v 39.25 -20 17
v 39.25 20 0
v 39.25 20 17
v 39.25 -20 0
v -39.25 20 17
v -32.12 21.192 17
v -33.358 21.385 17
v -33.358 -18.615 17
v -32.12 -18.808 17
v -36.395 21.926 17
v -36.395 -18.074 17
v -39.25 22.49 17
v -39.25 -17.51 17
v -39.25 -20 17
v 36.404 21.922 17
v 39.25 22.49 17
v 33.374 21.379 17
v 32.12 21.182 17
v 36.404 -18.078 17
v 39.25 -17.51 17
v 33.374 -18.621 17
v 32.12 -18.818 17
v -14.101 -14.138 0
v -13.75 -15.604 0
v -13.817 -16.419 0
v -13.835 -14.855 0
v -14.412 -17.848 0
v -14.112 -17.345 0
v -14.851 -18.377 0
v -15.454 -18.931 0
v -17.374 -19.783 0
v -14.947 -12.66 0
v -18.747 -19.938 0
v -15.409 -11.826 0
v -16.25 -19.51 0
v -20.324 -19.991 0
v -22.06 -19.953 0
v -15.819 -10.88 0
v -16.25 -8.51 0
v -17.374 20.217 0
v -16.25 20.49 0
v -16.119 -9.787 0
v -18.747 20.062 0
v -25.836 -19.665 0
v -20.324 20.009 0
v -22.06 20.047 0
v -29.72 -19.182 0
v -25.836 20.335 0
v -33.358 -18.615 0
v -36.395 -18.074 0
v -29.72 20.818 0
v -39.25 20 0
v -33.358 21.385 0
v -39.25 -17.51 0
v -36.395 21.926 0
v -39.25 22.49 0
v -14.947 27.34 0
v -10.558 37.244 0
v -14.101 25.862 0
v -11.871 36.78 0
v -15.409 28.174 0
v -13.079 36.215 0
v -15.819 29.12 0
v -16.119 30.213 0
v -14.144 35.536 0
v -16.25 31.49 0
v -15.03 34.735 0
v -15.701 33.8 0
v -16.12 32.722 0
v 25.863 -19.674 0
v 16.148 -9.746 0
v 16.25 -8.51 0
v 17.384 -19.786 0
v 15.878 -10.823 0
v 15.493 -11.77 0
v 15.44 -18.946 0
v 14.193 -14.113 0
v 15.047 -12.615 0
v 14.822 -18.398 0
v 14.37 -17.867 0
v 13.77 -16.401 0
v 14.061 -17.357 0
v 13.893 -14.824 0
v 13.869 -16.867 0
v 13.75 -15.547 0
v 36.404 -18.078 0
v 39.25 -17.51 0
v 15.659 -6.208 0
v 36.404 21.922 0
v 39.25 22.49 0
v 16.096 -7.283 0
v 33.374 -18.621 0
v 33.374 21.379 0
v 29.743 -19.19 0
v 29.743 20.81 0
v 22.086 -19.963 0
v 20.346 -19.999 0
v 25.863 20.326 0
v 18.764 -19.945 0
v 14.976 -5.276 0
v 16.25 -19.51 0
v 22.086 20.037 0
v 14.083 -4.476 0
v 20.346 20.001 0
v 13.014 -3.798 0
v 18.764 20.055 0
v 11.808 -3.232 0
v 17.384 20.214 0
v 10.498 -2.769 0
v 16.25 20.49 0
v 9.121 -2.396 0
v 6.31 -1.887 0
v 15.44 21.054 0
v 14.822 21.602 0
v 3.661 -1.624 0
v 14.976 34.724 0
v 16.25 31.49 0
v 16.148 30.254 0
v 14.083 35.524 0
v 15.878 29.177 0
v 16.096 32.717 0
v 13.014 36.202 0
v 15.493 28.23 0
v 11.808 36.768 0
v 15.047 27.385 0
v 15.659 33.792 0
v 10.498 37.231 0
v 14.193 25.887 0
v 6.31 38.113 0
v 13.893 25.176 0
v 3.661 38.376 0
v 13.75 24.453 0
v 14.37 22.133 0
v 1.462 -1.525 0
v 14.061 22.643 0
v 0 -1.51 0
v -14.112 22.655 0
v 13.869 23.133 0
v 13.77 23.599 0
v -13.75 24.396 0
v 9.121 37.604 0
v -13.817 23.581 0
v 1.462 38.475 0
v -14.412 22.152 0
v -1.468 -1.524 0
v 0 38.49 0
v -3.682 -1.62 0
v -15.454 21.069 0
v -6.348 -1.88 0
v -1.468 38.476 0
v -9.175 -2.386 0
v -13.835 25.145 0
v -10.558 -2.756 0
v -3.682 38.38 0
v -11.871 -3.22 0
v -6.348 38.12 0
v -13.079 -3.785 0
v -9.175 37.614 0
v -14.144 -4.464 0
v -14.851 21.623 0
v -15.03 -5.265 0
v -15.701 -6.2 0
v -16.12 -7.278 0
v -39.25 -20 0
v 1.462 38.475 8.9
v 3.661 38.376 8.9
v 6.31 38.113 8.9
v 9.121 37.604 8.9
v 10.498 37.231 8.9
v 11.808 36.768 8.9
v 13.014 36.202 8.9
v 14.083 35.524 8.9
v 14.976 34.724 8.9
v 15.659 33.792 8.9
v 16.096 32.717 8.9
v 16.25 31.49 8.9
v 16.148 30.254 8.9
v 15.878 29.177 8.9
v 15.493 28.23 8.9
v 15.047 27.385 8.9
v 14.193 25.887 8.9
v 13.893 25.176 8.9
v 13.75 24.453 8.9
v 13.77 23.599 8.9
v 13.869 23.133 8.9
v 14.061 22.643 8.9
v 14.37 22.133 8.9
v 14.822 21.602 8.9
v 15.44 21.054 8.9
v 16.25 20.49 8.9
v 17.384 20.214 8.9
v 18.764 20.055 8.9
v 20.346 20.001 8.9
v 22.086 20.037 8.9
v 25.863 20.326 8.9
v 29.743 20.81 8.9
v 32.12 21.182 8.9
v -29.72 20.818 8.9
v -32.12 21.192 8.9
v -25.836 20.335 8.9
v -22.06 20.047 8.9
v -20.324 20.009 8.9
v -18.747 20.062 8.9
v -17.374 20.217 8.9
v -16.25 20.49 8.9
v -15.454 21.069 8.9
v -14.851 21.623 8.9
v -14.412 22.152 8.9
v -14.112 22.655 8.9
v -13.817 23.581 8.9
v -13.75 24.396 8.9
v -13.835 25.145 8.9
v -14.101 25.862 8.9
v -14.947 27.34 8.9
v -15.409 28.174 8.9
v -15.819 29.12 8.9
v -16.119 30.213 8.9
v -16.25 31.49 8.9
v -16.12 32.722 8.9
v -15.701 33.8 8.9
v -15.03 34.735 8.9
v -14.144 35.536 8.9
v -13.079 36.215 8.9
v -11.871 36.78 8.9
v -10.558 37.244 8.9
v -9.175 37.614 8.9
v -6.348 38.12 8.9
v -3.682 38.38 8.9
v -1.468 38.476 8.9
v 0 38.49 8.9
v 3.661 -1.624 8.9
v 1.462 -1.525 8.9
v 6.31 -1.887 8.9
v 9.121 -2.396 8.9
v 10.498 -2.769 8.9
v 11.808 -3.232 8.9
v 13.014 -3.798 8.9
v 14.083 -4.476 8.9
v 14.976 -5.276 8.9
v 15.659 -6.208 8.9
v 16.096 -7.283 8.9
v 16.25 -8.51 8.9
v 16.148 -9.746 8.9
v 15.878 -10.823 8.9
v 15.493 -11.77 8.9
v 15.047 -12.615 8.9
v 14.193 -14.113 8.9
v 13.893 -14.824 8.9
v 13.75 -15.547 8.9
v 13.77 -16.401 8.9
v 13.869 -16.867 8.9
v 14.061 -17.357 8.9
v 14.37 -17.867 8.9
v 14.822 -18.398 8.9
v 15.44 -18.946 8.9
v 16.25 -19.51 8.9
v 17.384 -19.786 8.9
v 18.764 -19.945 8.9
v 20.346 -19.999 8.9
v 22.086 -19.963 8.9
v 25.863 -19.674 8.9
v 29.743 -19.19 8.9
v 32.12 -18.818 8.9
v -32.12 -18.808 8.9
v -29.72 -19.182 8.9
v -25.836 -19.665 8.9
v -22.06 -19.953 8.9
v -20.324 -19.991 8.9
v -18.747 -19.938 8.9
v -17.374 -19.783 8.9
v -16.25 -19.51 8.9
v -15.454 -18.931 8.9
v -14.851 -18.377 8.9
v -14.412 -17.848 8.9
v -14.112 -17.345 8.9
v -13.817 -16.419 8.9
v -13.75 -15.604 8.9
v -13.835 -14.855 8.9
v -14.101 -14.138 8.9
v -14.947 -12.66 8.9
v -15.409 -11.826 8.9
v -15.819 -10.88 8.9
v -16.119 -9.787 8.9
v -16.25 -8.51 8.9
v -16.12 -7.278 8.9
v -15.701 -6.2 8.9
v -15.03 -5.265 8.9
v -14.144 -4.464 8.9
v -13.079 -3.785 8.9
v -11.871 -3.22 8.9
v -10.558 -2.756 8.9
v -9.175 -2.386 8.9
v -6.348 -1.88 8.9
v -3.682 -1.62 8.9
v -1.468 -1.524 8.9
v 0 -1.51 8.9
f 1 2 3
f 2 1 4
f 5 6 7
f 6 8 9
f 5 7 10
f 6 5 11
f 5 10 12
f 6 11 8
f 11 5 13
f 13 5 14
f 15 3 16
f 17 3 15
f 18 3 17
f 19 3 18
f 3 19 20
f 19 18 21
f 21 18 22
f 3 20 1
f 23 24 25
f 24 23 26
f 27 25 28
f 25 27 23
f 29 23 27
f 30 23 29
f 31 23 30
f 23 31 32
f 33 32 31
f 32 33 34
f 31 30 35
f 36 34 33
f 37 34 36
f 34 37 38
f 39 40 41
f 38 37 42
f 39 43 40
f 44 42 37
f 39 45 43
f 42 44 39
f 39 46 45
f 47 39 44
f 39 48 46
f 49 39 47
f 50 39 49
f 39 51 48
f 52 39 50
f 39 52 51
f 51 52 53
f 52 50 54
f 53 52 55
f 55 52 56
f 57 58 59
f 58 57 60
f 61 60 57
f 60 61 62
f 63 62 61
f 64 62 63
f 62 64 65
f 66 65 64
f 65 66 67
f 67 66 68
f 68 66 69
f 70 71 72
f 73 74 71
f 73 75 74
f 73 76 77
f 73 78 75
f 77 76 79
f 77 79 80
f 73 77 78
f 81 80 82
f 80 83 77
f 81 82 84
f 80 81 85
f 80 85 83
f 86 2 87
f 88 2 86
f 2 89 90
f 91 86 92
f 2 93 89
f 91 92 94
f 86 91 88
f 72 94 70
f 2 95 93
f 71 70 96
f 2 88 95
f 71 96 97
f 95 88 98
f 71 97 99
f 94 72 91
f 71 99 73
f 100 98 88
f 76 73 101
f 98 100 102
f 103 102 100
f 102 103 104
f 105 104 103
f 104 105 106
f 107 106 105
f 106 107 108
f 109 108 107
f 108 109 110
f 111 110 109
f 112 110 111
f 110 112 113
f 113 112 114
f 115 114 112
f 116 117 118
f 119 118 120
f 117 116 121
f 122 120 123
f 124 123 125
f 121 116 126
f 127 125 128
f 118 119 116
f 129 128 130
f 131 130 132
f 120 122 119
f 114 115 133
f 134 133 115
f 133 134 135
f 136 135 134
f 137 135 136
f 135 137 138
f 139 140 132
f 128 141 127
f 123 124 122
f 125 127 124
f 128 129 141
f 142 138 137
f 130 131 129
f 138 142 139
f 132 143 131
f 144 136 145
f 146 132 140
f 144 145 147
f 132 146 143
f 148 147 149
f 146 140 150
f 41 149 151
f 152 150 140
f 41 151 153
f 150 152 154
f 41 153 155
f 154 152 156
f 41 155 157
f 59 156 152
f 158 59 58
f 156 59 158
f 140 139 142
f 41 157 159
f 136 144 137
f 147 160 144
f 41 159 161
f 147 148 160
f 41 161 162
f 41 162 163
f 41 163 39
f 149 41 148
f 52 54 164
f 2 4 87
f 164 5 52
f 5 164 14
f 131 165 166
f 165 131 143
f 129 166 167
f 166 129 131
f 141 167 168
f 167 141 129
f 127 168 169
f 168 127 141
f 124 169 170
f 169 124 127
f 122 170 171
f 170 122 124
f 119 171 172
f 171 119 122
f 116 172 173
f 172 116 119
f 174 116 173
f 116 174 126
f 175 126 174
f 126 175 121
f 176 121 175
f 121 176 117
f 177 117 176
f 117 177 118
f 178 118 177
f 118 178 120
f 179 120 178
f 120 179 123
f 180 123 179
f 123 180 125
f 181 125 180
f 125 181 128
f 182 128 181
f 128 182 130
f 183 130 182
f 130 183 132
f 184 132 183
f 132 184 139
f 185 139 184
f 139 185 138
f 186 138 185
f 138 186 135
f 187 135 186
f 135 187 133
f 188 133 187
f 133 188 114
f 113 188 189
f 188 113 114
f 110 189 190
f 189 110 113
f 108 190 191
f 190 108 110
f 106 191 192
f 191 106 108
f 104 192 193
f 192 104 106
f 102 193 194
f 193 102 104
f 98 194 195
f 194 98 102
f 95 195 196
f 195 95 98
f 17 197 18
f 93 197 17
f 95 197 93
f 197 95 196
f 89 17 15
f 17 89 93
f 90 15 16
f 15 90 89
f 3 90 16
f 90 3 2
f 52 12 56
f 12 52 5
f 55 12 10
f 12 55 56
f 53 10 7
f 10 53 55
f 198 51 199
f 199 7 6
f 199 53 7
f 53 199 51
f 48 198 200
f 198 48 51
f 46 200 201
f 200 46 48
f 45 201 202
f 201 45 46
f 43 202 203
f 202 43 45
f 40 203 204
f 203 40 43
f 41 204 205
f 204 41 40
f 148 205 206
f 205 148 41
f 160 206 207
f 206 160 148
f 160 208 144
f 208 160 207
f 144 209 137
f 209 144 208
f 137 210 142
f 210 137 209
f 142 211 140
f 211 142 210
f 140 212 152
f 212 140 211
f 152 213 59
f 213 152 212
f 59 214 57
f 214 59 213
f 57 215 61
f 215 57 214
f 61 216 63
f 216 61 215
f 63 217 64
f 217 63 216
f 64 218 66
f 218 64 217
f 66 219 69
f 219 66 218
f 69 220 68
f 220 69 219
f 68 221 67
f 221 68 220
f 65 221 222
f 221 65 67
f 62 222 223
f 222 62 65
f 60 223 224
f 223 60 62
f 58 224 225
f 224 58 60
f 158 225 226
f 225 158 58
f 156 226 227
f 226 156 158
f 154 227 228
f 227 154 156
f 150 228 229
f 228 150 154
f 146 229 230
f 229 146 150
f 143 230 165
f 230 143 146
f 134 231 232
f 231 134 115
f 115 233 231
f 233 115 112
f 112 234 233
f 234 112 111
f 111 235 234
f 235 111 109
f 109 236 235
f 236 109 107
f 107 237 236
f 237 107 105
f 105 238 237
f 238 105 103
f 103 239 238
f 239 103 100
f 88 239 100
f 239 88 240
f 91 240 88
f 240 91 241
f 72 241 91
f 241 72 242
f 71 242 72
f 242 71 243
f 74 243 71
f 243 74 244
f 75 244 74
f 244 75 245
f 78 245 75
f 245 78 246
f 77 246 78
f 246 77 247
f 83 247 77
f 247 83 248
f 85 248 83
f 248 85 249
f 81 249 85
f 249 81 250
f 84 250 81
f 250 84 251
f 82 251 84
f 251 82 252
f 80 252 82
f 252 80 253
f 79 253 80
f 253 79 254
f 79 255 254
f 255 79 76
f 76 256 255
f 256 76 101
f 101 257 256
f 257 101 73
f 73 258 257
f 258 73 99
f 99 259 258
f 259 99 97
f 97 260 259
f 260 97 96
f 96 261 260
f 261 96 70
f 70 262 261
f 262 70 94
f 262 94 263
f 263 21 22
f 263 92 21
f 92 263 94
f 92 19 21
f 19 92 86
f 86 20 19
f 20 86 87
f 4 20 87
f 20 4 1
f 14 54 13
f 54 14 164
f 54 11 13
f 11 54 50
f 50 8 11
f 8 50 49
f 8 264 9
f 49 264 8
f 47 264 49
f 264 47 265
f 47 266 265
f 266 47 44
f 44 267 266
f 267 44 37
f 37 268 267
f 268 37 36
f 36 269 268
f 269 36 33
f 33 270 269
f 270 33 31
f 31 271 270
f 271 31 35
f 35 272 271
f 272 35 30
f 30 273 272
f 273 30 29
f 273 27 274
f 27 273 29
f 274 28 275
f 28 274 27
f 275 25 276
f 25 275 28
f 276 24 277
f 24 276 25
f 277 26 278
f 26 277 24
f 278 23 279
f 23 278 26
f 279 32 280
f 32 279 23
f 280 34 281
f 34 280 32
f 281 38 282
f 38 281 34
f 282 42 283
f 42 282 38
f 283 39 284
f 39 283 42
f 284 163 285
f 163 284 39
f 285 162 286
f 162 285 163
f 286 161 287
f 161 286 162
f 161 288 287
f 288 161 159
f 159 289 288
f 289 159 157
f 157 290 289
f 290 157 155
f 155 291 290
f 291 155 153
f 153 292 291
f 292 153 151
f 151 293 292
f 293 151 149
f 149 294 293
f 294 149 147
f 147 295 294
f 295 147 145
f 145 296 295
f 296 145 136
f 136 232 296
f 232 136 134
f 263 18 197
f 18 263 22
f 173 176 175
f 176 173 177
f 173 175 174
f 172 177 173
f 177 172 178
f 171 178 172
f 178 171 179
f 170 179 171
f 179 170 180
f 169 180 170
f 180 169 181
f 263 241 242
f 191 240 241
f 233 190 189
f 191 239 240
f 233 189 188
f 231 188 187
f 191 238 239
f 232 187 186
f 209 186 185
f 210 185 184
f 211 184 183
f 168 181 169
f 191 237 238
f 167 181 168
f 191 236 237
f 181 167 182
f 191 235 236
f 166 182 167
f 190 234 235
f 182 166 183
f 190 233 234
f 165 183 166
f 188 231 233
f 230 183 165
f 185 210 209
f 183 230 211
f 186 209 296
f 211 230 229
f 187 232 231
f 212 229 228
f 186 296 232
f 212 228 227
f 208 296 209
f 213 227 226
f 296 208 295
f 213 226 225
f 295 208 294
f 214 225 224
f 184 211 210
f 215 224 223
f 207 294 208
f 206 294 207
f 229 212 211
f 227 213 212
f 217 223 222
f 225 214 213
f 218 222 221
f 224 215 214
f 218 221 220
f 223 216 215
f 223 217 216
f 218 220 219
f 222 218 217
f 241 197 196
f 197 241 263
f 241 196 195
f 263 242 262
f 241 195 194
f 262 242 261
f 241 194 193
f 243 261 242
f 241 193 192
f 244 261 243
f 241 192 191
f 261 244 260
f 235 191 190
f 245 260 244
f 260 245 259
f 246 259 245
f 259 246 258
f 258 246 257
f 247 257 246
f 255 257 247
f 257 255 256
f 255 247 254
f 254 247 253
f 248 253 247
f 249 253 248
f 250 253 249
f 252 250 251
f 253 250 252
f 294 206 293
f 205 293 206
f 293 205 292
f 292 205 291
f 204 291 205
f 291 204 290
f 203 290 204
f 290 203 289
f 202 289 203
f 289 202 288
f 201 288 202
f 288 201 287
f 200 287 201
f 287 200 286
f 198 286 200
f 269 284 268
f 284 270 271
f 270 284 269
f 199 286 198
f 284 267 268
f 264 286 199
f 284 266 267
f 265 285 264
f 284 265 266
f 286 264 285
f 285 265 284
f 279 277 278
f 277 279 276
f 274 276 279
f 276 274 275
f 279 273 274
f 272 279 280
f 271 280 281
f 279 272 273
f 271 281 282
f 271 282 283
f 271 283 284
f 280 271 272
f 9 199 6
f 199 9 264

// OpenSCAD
trackSize	= [78.5, 40, 17];	// 78.5, 42.3, 17


curveSize	= [78.5, 18.21, 1];	// CORRECTED

trackInset	= [trackSize[0] - 7.13 * 2, trackSize[1] + 20, trackSize[2] - 8.8];

difference(){
	union(){
		// Track base object
		translate([0, 0, trackSize[2]/2]) 
			cube(trackSize, center=true);

		// Puzzle male end
		translate([0, trackSize[1]/2, 0]) 
			PuzzleNub4(trackSize[2]);
	}
	// Puzzle female end
	translate([0, -trackSize[1]/2, -0.5]) 
		PuzzleNub4(trackSize[2] + 1);	// +1 to make compile look nice

	translate([0, curveSize[1]/2, trackInset[2]/2 + 8.9])
		cube(trackInset, center=true);

	// Cutoffs to make sure sides are the correct size
	translate([-50 - trackSize[0]/2,0,0]) cube([100,100,100], center=true);
	translate([50 + trackSize[0]/2,0,0]) cube([100,100,100], center=true);		
}


// fourth, much more precise, under testing
module PuzzleNub4(h)
{
	translate([0, 3.99, 0])
	scale([25.4/90, -25.4/90, 1]) union()
	{
		linear_extrude(height=h)
			polygon([[-139.074800,5.314975],[-139.074800,51.377975],[139.074800,51.377975],[139.074800,5.314975],[128.989219,7.325870],[118.254271,9.251496],[105.388578,11.267912],[91.640159,12.983124],[78.257034,14.005136],[72.092462,14.133693],[66.487221,13.941951],[61.597313,13.380912],[57.578740,12.401575],[54.708960,10.403186],[52.518293,8.460942],[50.918967,6.581481],[49.823212,4.771438],[49.143256,3.037449],[48.791329,1.386152],[48.720472,-1.641825],[49.225789,-4.203090],[50.288691,-6.721078],[53.316060,-12.031125],[54.894932,-15.025136],[56.260201,-18.379772],[57.219070,-22.196010],[57.578740,-26.574825],[57.032091,-30.922990],[55.485181,-34.730757],[53.065150,-38.033984],[49.899141,-40.868529],[46.114293,-43.270248],[41.837748,-45.275000],[37.196647,-46.918643],[32.318131,-48.237032],[22.357420,-50.041486],[12.972741,-50.975220],[5.181225,-51.325096],[0.000000,-51.377975],[-5.202375,-51.329326],[-13.045256,-50.989723],[-22.493385,-50.068678],[-32.511504,-48.275706],[-37.410792,-46.961471],[-42.064357,-45.320321],[-46.342790,-43.315947],[-50.116685,-40.912037],[-53.256635,-38.072280],[-55.633232,-34.760367],[-57.117070,-30.939985],[-57.578740,-26.574825],[-57.113552,-22.051074],[-56.050761,-18.177697],[-54.597442,-14.826896],[-52.960667,-11.870875],[-49.965042,-6.631978],[-49.020339,-4.093507],[-48.720472,-1.438625],[-48.958137,1.448814],[-50.003224,4.730013],[-51.067853,6.512638],[-52.621501,8.386942],[-54.759890,10.350672],[-57.578740,12.401575],[-61.562020,13.368173],[-66.425733,13.919758],[-72.012936,14.104988],[-78.166684,13.972525],[-91.546045,12.949155],[-105.308268,11.238925],[-118.197803,9.231114],[-128.959102,7.315000],[-139.074800,5.314975]]);
  }
}
